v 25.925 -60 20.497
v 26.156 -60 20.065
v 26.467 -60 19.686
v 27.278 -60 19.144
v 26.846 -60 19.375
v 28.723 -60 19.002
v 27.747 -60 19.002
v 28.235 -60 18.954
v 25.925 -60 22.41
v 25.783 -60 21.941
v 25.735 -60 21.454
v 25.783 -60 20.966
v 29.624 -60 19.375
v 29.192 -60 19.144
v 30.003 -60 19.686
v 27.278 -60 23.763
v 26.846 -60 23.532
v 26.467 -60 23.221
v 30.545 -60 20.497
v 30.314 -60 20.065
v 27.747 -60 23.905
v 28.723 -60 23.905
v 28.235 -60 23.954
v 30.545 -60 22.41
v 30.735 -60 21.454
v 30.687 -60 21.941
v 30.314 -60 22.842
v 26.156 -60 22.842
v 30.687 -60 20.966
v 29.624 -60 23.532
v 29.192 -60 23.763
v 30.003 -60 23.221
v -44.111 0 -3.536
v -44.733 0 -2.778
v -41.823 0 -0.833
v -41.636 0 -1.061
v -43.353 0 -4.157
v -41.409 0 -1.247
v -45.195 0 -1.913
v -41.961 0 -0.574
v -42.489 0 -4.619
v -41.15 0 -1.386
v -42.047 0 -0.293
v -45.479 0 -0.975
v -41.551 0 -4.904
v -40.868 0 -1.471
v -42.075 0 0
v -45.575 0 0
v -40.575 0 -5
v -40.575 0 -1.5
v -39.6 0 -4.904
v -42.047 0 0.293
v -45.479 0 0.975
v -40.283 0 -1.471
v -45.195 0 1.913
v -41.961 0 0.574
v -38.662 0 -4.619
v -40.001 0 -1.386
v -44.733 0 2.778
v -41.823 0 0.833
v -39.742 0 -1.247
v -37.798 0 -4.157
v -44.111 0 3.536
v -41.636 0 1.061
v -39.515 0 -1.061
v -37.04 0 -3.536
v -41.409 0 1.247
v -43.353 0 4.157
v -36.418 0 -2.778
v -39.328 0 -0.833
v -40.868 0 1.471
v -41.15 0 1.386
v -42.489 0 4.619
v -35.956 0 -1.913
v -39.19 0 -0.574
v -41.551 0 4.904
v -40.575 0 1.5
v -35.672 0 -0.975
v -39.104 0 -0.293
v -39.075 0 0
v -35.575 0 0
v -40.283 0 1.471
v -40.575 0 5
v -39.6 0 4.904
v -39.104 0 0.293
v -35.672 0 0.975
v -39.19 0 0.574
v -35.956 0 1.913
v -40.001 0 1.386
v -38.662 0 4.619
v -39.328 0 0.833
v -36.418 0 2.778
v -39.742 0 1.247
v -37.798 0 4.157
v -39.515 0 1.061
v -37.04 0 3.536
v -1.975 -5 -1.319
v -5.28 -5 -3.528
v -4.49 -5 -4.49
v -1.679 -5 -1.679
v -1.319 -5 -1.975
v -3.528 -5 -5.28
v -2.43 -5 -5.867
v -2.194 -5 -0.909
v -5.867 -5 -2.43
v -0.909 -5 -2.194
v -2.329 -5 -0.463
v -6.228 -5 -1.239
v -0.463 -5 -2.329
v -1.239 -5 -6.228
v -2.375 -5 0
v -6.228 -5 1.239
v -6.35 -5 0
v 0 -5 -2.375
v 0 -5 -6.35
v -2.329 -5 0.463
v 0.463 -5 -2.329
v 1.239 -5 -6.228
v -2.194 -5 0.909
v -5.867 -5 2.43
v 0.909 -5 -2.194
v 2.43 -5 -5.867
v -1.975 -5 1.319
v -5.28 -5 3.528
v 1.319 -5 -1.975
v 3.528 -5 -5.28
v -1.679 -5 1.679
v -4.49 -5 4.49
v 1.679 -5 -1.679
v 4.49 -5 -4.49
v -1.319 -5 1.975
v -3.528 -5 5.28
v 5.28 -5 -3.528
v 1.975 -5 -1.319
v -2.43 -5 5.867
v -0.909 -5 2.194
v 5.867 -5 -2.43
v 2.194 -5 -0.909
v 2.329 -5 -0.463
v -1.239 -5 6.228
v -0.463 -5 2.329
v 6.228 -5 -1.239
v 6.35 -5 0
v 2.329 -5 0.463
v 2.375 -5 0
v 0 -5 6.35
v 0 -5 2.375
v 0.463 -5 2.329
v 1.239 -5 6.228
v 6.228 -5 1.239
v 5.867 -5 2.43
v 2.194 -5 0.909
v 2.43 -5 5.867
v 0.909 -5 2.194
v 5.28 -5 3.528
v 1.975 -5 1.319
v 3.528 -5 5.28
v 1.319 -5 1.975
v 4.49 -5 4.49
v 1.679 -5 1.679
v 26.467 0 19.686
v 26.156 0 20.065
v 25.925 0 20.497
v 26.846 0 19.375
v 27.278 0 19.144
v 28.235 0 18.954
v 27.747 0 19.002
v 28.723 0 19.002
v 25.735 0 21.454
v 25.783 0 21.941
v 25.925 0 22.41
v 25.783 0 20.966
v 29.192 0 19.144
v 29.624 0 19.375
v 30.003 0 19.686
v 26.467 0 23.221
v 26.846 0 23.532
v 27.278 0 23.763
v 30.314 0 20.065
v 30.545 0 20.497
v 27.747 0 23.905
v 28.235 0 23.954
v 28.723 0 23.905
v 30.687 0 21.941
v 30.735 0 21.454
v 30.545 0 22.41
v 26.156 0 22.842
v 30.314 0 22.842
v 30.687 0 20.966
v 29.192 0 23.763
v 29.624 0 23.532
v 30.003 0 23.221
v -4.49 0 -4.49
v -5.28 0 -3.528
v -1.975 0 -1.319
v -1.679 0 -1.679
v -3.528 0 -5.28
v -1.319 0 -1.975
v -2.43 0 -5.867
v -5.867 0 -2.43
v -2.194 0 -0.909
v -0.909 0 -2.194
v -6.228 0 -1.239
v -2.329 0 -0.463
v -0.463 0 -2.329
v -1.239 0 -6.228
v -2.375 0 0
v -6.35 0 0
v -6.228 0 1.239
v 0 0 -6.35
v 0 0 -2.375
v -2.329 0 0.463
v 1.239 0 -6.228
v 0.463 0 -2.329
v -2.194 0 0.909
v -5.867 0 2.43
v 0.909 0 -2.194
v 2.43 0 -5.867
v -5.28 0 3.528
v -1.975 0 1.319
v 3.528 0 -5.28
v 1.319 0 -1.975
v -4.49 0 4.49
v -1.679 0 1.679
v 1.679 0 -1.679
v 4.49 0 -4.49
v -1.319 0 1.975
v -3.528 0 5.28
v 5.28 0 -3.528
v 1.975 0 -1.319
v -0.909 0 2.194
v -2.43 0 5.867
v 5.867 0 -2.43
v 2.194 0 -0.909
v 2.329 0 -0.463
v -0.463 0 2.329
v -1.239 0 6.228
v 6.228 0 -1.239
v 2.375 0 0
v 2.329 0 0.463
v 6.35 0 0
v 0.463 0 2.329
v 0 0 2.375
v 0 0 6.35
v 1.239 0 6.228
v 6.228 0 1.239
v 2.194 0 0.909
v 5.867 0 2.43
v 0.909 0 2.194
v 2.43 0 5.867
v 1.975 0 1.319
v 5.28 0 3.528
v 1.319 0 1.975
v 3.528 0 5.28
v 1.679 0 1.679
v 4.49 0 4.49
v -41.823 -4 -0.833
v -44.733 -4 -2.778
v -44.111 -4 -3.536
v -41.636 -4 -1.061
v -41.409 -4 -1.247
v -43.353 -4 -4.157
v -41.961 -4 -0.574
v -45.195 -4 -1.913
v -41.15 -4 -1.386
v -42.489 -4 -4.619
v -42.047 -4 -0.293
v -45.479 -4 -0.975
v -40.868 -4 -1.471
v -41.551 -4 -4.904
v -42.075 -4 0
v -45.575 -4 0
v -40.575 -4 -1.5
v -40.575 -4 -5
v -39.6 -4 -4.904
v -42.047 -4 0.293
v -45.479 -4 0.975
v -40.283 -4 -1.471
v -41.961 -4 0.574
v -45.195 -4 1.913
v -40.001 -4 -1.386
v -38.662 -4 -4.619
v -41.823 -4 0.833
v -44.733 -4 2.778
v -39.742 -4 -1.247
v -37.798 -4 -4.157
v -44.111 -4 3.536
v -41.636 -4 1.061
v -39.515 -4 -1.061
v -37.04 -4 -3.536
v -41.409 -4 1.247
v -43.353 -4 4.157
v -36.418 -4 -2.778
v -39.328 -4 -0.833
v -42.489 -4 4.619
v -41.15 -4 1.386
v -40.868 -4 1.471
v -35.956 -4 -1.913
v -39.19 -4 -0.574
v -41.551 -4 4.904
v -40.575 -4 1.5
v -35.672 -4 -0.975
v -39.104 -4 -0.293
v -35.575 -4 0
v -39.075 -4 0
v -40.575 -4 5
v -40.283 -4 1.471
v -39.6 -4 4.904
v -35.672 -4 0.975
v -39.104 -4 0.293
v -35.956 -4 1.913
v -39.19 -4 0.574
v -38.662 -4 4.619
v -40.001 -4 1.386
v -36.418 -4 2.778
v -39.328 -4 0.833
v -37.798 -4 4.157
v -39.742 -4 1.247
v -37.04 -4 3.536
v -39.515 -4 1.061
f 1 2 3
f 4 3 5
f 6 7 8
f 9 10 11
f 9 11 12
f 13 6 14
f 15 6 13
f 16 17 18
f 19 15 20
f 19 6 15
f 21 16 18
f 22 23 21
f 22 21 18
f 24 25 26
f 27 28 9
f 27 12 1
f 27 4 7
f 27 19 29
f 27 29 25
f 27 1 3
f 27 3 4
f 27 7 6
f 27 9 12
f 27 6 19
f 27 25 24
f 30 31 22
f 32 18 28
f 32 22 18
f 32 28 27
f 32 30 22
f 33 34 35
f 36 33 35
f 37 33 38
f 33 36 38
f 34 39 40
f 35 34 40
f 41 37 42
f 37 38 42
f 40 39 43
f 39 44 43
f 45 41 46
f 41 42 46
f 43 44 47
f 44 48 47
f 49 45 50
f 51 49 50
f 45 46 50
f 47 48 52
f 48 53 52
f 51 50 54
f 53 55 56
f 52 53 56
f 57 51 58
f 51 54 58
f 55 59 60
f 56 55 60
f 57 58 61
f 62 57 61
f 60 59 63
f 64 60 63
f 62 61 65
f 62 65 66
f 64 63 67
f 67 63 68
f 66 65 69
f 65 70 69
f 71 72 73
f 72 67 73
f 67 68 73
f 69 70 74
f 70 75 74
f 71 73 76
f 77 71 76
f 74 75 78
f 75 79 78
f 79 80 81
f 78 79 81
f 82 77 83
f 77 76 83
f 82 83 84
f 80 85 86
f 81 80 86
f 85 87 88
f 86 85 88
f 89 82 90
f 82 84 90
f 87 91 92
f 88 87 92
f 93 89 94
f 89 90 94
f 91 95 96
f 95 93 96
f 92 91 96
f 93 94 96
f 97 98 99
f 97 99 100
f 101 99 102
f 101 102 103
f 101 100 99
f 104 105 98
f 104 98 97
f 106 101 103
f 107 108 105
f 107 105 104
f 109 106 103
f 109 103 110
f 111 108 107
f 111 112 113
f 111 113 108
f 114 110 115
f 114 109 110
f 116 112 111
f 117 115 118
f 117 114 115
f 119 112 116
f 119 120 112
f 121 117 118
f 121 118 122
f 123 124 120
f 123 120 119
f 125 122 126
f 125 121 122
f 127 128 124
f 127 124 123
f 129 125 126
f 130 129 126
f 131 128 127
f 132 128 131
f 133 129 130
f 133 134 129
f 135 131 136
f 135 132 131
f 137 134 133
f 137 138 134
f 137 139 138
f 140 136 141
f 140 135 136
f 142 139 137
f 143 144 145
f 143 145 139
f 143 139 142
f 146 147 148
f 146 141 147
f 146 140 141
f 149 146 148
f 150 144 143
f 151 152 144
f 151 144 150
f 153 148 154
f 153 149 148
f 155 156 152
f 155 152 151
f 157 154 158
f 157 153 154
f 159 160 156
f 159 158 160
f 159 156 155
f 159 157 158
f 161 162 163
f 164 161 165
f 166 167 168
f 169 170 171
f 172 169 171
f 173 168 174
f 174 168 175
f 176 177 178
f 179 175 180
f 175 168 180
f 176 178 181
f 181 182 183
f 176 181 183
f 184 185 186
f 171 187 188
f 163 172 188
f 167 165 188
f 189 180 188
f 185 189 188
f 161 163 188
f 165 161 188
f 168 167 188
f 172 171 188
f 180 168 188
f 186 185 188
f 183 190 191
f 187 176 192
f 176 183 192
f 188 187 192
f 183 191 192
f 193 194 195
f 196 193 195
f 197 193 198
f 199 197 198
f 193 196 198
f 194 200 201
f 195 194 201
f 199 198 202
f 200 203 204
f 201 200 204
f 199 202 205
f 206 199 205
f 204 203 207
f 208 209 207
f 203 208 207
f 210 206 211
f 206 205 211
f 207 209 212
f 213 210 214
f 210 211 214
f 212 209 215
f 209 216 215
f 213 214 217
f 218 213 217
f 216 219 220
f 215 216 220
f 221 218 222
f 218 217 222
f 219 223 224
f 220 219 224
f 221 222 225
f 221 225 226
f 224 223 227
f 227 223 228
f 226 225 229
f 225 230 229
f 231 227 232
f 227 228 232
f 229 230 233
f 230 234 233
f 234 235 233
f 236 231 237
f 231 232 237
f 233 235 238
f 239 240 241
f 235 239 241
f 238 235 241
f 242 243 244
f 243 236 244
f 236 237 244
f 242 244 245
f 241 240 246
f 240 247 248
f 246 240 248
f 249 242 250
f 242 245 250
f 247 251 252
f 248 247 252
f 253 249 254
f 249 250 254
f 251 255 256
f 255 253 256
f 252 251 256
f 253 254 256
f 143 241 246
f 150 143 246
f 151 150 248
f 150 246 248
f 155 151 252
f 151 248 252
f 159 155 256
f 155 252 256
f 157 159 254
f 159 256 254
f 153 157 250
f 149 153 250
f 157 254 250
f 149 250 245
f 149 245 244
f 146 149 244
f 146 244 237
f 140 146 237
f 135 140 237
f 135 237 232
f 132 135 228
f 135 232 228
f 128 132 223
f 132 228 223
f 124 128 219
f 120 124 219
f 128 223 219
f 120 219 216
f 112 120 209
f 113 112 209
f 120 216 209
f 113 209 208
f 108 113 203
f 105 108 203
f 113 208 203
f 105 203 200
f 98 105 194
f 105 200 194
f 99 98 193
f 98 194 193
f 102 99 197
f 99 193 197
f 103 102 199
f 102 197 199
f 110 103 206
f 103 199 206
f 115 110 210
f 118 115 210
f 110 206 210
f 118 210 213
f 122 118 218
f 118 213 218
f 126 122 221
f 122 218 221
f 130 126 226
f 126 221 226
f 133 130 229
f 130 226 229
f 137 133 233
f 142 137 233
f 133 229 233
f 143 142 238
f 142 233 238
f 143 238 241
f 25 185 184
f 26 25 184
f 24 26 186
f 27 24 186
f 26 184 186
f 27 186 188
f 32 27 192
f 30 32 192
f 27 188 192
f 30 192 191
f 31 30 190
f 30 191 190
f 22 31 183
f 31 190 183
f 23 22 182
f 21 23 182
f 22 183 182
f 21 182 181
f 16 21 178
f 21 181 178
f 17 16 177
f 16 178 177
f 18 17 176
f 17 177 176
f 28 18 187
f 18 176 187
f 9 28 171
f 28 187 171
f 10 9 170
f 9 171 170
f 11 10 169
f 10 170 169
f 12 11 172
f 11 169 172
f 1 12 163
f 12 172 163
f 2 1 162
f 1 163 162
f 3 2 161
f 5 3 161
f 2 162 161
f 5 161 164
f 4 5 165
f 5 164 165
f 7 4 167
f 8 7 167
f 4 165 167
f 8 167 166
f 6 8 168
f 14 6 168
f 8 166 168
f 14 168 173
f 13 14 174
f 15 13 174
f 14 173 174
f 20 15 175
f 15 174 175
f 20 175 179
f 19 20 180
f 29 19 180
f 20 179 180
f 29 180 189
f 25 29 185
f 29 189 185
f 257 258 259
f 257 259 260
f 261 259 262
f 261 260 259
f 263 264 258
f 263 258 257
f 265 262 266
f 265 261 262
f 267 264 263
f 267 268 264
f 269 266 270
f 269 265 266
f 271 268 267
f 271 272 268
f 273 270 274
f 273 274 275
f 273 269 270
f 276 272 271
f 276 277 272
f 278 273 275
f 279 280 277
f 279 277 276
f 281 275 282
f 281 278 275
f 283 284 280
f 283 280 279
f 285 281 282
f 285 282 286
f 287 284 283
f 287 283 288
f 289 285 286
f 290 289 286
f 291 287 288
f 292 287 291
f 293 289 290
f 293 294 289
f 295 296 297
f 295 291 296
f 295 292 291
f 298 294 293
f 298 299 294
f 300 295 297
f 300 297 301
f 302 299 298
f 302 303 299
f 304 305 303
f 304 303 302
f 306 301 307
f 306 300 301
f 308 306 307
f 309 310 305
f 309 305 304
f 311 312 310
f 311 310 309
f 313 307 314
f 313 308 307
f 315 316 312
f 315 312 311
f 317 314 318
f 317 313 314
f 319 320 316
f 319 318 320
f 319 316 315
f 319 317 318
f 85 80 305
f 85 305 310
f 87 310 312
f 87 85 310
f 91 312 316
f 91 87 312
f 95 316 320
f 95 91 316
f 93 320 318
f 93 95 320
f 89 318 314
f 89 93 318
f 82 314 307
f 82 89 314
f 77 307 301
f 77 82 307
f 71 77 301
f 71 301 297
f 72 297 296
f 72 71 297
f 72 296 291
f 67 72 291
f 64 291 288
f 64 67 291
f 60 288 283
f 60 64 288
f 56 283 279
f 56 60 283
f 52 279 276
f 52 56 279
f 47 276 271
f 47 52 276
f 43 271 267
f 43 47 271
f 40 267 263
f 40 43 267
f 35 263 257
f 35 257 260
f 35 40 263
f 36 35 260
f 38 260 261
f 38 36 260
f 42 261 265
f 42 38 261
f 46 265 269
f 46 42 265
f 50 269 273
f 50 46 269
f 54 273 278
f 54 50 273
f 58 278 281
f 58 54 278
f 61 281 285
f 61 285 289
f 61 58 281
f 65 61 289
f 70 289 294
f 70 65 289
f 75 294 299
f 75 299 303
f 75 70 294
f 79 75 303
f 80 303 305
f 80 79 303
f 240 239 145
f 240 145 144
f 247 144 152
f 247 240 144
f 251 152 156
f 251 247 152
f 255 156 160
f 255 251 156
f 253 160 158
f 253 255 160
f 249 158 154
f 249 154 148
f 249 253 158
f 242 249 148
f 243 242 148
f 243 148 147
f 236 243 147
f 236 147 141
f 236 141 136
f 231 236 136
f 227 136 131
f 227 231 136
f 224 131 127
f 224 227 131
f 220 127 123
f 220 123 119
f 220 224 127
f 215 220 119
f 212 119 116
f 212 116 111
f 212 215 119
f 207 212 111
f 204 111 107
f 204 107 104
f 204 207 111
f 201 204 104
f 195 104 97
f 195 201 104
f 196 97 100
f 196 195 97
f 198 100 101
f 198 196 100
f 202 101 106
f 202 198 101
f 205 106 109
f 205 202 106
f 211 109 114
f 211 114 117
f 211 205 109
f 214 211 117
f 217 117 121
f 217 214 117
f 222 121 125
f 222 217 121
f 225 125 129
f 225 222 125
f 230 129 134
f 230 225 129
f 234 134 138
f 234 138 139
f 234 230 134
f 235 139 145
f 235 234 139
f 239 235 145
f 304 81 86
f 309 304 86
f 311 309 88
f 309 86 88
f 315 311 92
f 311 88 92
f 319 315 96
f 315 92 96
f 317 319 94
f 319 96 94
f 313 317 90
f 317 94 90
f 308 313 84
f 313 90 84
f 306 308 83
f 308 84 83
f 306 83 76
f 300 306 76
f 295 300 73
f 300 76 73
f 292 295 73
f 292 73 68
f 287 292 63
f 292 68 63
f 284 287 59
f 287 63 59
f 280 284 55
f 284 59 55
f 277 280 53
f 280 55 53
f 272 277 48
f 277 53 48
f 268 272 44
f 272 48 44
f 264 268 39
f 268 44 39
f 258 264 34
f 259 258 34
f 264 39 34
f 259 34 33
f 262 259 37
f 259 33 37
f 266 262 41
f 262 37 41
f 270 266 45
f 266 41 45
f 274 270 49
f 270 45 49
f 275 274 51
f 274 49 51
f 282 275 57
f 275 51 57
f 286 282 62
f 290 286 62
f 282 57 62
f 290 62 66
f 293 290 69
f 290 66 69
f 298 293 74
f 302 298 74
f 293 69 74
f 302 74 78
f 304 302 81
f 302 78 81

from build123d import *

# Parameters (mm, degrees)
F0_R     = 6.35
F0_R_2   = 2.375
F1_DEPTH = 5
F2_R     = 2.5
F3_DEPTH = 60
F4_R     = 5
F4_R_2   = 1.5
F5_DEPTH = 4


with BuildPart() as f1:
    # F0 (on Front) → F1 (new body)
    with BuildSketch(Plane.XZ):
        Circle(F0_R)
        Circle(F0_R_2, mode=Mode.SUBTRACT)
    extrude(amount=F1_DEPTH)


with BuildPart() as f3:
    # F2 (on Front) → F3 (new body)
    with BuildSketch(Plane.XZ):
        with Locations((28.235165, 21.453524)):
            Circle(F2_R)
    extrude(amount=F3_DEPTH)


with BuildPart() as f5:
    # F4 (on Front) → F5 (new body)
    with BuildSketch(Plane.XZ):
        with Locations((-40.575489, 0)):
            Circle(F4_R)
        with Locations((-40.575489, 0)):
            Circle(F4_R_2, mode=Mode.SUBTRACT)
    extrude(amount=F5_DEPTH)


solid = Compound([f1.part, f3.part, f5.part])
